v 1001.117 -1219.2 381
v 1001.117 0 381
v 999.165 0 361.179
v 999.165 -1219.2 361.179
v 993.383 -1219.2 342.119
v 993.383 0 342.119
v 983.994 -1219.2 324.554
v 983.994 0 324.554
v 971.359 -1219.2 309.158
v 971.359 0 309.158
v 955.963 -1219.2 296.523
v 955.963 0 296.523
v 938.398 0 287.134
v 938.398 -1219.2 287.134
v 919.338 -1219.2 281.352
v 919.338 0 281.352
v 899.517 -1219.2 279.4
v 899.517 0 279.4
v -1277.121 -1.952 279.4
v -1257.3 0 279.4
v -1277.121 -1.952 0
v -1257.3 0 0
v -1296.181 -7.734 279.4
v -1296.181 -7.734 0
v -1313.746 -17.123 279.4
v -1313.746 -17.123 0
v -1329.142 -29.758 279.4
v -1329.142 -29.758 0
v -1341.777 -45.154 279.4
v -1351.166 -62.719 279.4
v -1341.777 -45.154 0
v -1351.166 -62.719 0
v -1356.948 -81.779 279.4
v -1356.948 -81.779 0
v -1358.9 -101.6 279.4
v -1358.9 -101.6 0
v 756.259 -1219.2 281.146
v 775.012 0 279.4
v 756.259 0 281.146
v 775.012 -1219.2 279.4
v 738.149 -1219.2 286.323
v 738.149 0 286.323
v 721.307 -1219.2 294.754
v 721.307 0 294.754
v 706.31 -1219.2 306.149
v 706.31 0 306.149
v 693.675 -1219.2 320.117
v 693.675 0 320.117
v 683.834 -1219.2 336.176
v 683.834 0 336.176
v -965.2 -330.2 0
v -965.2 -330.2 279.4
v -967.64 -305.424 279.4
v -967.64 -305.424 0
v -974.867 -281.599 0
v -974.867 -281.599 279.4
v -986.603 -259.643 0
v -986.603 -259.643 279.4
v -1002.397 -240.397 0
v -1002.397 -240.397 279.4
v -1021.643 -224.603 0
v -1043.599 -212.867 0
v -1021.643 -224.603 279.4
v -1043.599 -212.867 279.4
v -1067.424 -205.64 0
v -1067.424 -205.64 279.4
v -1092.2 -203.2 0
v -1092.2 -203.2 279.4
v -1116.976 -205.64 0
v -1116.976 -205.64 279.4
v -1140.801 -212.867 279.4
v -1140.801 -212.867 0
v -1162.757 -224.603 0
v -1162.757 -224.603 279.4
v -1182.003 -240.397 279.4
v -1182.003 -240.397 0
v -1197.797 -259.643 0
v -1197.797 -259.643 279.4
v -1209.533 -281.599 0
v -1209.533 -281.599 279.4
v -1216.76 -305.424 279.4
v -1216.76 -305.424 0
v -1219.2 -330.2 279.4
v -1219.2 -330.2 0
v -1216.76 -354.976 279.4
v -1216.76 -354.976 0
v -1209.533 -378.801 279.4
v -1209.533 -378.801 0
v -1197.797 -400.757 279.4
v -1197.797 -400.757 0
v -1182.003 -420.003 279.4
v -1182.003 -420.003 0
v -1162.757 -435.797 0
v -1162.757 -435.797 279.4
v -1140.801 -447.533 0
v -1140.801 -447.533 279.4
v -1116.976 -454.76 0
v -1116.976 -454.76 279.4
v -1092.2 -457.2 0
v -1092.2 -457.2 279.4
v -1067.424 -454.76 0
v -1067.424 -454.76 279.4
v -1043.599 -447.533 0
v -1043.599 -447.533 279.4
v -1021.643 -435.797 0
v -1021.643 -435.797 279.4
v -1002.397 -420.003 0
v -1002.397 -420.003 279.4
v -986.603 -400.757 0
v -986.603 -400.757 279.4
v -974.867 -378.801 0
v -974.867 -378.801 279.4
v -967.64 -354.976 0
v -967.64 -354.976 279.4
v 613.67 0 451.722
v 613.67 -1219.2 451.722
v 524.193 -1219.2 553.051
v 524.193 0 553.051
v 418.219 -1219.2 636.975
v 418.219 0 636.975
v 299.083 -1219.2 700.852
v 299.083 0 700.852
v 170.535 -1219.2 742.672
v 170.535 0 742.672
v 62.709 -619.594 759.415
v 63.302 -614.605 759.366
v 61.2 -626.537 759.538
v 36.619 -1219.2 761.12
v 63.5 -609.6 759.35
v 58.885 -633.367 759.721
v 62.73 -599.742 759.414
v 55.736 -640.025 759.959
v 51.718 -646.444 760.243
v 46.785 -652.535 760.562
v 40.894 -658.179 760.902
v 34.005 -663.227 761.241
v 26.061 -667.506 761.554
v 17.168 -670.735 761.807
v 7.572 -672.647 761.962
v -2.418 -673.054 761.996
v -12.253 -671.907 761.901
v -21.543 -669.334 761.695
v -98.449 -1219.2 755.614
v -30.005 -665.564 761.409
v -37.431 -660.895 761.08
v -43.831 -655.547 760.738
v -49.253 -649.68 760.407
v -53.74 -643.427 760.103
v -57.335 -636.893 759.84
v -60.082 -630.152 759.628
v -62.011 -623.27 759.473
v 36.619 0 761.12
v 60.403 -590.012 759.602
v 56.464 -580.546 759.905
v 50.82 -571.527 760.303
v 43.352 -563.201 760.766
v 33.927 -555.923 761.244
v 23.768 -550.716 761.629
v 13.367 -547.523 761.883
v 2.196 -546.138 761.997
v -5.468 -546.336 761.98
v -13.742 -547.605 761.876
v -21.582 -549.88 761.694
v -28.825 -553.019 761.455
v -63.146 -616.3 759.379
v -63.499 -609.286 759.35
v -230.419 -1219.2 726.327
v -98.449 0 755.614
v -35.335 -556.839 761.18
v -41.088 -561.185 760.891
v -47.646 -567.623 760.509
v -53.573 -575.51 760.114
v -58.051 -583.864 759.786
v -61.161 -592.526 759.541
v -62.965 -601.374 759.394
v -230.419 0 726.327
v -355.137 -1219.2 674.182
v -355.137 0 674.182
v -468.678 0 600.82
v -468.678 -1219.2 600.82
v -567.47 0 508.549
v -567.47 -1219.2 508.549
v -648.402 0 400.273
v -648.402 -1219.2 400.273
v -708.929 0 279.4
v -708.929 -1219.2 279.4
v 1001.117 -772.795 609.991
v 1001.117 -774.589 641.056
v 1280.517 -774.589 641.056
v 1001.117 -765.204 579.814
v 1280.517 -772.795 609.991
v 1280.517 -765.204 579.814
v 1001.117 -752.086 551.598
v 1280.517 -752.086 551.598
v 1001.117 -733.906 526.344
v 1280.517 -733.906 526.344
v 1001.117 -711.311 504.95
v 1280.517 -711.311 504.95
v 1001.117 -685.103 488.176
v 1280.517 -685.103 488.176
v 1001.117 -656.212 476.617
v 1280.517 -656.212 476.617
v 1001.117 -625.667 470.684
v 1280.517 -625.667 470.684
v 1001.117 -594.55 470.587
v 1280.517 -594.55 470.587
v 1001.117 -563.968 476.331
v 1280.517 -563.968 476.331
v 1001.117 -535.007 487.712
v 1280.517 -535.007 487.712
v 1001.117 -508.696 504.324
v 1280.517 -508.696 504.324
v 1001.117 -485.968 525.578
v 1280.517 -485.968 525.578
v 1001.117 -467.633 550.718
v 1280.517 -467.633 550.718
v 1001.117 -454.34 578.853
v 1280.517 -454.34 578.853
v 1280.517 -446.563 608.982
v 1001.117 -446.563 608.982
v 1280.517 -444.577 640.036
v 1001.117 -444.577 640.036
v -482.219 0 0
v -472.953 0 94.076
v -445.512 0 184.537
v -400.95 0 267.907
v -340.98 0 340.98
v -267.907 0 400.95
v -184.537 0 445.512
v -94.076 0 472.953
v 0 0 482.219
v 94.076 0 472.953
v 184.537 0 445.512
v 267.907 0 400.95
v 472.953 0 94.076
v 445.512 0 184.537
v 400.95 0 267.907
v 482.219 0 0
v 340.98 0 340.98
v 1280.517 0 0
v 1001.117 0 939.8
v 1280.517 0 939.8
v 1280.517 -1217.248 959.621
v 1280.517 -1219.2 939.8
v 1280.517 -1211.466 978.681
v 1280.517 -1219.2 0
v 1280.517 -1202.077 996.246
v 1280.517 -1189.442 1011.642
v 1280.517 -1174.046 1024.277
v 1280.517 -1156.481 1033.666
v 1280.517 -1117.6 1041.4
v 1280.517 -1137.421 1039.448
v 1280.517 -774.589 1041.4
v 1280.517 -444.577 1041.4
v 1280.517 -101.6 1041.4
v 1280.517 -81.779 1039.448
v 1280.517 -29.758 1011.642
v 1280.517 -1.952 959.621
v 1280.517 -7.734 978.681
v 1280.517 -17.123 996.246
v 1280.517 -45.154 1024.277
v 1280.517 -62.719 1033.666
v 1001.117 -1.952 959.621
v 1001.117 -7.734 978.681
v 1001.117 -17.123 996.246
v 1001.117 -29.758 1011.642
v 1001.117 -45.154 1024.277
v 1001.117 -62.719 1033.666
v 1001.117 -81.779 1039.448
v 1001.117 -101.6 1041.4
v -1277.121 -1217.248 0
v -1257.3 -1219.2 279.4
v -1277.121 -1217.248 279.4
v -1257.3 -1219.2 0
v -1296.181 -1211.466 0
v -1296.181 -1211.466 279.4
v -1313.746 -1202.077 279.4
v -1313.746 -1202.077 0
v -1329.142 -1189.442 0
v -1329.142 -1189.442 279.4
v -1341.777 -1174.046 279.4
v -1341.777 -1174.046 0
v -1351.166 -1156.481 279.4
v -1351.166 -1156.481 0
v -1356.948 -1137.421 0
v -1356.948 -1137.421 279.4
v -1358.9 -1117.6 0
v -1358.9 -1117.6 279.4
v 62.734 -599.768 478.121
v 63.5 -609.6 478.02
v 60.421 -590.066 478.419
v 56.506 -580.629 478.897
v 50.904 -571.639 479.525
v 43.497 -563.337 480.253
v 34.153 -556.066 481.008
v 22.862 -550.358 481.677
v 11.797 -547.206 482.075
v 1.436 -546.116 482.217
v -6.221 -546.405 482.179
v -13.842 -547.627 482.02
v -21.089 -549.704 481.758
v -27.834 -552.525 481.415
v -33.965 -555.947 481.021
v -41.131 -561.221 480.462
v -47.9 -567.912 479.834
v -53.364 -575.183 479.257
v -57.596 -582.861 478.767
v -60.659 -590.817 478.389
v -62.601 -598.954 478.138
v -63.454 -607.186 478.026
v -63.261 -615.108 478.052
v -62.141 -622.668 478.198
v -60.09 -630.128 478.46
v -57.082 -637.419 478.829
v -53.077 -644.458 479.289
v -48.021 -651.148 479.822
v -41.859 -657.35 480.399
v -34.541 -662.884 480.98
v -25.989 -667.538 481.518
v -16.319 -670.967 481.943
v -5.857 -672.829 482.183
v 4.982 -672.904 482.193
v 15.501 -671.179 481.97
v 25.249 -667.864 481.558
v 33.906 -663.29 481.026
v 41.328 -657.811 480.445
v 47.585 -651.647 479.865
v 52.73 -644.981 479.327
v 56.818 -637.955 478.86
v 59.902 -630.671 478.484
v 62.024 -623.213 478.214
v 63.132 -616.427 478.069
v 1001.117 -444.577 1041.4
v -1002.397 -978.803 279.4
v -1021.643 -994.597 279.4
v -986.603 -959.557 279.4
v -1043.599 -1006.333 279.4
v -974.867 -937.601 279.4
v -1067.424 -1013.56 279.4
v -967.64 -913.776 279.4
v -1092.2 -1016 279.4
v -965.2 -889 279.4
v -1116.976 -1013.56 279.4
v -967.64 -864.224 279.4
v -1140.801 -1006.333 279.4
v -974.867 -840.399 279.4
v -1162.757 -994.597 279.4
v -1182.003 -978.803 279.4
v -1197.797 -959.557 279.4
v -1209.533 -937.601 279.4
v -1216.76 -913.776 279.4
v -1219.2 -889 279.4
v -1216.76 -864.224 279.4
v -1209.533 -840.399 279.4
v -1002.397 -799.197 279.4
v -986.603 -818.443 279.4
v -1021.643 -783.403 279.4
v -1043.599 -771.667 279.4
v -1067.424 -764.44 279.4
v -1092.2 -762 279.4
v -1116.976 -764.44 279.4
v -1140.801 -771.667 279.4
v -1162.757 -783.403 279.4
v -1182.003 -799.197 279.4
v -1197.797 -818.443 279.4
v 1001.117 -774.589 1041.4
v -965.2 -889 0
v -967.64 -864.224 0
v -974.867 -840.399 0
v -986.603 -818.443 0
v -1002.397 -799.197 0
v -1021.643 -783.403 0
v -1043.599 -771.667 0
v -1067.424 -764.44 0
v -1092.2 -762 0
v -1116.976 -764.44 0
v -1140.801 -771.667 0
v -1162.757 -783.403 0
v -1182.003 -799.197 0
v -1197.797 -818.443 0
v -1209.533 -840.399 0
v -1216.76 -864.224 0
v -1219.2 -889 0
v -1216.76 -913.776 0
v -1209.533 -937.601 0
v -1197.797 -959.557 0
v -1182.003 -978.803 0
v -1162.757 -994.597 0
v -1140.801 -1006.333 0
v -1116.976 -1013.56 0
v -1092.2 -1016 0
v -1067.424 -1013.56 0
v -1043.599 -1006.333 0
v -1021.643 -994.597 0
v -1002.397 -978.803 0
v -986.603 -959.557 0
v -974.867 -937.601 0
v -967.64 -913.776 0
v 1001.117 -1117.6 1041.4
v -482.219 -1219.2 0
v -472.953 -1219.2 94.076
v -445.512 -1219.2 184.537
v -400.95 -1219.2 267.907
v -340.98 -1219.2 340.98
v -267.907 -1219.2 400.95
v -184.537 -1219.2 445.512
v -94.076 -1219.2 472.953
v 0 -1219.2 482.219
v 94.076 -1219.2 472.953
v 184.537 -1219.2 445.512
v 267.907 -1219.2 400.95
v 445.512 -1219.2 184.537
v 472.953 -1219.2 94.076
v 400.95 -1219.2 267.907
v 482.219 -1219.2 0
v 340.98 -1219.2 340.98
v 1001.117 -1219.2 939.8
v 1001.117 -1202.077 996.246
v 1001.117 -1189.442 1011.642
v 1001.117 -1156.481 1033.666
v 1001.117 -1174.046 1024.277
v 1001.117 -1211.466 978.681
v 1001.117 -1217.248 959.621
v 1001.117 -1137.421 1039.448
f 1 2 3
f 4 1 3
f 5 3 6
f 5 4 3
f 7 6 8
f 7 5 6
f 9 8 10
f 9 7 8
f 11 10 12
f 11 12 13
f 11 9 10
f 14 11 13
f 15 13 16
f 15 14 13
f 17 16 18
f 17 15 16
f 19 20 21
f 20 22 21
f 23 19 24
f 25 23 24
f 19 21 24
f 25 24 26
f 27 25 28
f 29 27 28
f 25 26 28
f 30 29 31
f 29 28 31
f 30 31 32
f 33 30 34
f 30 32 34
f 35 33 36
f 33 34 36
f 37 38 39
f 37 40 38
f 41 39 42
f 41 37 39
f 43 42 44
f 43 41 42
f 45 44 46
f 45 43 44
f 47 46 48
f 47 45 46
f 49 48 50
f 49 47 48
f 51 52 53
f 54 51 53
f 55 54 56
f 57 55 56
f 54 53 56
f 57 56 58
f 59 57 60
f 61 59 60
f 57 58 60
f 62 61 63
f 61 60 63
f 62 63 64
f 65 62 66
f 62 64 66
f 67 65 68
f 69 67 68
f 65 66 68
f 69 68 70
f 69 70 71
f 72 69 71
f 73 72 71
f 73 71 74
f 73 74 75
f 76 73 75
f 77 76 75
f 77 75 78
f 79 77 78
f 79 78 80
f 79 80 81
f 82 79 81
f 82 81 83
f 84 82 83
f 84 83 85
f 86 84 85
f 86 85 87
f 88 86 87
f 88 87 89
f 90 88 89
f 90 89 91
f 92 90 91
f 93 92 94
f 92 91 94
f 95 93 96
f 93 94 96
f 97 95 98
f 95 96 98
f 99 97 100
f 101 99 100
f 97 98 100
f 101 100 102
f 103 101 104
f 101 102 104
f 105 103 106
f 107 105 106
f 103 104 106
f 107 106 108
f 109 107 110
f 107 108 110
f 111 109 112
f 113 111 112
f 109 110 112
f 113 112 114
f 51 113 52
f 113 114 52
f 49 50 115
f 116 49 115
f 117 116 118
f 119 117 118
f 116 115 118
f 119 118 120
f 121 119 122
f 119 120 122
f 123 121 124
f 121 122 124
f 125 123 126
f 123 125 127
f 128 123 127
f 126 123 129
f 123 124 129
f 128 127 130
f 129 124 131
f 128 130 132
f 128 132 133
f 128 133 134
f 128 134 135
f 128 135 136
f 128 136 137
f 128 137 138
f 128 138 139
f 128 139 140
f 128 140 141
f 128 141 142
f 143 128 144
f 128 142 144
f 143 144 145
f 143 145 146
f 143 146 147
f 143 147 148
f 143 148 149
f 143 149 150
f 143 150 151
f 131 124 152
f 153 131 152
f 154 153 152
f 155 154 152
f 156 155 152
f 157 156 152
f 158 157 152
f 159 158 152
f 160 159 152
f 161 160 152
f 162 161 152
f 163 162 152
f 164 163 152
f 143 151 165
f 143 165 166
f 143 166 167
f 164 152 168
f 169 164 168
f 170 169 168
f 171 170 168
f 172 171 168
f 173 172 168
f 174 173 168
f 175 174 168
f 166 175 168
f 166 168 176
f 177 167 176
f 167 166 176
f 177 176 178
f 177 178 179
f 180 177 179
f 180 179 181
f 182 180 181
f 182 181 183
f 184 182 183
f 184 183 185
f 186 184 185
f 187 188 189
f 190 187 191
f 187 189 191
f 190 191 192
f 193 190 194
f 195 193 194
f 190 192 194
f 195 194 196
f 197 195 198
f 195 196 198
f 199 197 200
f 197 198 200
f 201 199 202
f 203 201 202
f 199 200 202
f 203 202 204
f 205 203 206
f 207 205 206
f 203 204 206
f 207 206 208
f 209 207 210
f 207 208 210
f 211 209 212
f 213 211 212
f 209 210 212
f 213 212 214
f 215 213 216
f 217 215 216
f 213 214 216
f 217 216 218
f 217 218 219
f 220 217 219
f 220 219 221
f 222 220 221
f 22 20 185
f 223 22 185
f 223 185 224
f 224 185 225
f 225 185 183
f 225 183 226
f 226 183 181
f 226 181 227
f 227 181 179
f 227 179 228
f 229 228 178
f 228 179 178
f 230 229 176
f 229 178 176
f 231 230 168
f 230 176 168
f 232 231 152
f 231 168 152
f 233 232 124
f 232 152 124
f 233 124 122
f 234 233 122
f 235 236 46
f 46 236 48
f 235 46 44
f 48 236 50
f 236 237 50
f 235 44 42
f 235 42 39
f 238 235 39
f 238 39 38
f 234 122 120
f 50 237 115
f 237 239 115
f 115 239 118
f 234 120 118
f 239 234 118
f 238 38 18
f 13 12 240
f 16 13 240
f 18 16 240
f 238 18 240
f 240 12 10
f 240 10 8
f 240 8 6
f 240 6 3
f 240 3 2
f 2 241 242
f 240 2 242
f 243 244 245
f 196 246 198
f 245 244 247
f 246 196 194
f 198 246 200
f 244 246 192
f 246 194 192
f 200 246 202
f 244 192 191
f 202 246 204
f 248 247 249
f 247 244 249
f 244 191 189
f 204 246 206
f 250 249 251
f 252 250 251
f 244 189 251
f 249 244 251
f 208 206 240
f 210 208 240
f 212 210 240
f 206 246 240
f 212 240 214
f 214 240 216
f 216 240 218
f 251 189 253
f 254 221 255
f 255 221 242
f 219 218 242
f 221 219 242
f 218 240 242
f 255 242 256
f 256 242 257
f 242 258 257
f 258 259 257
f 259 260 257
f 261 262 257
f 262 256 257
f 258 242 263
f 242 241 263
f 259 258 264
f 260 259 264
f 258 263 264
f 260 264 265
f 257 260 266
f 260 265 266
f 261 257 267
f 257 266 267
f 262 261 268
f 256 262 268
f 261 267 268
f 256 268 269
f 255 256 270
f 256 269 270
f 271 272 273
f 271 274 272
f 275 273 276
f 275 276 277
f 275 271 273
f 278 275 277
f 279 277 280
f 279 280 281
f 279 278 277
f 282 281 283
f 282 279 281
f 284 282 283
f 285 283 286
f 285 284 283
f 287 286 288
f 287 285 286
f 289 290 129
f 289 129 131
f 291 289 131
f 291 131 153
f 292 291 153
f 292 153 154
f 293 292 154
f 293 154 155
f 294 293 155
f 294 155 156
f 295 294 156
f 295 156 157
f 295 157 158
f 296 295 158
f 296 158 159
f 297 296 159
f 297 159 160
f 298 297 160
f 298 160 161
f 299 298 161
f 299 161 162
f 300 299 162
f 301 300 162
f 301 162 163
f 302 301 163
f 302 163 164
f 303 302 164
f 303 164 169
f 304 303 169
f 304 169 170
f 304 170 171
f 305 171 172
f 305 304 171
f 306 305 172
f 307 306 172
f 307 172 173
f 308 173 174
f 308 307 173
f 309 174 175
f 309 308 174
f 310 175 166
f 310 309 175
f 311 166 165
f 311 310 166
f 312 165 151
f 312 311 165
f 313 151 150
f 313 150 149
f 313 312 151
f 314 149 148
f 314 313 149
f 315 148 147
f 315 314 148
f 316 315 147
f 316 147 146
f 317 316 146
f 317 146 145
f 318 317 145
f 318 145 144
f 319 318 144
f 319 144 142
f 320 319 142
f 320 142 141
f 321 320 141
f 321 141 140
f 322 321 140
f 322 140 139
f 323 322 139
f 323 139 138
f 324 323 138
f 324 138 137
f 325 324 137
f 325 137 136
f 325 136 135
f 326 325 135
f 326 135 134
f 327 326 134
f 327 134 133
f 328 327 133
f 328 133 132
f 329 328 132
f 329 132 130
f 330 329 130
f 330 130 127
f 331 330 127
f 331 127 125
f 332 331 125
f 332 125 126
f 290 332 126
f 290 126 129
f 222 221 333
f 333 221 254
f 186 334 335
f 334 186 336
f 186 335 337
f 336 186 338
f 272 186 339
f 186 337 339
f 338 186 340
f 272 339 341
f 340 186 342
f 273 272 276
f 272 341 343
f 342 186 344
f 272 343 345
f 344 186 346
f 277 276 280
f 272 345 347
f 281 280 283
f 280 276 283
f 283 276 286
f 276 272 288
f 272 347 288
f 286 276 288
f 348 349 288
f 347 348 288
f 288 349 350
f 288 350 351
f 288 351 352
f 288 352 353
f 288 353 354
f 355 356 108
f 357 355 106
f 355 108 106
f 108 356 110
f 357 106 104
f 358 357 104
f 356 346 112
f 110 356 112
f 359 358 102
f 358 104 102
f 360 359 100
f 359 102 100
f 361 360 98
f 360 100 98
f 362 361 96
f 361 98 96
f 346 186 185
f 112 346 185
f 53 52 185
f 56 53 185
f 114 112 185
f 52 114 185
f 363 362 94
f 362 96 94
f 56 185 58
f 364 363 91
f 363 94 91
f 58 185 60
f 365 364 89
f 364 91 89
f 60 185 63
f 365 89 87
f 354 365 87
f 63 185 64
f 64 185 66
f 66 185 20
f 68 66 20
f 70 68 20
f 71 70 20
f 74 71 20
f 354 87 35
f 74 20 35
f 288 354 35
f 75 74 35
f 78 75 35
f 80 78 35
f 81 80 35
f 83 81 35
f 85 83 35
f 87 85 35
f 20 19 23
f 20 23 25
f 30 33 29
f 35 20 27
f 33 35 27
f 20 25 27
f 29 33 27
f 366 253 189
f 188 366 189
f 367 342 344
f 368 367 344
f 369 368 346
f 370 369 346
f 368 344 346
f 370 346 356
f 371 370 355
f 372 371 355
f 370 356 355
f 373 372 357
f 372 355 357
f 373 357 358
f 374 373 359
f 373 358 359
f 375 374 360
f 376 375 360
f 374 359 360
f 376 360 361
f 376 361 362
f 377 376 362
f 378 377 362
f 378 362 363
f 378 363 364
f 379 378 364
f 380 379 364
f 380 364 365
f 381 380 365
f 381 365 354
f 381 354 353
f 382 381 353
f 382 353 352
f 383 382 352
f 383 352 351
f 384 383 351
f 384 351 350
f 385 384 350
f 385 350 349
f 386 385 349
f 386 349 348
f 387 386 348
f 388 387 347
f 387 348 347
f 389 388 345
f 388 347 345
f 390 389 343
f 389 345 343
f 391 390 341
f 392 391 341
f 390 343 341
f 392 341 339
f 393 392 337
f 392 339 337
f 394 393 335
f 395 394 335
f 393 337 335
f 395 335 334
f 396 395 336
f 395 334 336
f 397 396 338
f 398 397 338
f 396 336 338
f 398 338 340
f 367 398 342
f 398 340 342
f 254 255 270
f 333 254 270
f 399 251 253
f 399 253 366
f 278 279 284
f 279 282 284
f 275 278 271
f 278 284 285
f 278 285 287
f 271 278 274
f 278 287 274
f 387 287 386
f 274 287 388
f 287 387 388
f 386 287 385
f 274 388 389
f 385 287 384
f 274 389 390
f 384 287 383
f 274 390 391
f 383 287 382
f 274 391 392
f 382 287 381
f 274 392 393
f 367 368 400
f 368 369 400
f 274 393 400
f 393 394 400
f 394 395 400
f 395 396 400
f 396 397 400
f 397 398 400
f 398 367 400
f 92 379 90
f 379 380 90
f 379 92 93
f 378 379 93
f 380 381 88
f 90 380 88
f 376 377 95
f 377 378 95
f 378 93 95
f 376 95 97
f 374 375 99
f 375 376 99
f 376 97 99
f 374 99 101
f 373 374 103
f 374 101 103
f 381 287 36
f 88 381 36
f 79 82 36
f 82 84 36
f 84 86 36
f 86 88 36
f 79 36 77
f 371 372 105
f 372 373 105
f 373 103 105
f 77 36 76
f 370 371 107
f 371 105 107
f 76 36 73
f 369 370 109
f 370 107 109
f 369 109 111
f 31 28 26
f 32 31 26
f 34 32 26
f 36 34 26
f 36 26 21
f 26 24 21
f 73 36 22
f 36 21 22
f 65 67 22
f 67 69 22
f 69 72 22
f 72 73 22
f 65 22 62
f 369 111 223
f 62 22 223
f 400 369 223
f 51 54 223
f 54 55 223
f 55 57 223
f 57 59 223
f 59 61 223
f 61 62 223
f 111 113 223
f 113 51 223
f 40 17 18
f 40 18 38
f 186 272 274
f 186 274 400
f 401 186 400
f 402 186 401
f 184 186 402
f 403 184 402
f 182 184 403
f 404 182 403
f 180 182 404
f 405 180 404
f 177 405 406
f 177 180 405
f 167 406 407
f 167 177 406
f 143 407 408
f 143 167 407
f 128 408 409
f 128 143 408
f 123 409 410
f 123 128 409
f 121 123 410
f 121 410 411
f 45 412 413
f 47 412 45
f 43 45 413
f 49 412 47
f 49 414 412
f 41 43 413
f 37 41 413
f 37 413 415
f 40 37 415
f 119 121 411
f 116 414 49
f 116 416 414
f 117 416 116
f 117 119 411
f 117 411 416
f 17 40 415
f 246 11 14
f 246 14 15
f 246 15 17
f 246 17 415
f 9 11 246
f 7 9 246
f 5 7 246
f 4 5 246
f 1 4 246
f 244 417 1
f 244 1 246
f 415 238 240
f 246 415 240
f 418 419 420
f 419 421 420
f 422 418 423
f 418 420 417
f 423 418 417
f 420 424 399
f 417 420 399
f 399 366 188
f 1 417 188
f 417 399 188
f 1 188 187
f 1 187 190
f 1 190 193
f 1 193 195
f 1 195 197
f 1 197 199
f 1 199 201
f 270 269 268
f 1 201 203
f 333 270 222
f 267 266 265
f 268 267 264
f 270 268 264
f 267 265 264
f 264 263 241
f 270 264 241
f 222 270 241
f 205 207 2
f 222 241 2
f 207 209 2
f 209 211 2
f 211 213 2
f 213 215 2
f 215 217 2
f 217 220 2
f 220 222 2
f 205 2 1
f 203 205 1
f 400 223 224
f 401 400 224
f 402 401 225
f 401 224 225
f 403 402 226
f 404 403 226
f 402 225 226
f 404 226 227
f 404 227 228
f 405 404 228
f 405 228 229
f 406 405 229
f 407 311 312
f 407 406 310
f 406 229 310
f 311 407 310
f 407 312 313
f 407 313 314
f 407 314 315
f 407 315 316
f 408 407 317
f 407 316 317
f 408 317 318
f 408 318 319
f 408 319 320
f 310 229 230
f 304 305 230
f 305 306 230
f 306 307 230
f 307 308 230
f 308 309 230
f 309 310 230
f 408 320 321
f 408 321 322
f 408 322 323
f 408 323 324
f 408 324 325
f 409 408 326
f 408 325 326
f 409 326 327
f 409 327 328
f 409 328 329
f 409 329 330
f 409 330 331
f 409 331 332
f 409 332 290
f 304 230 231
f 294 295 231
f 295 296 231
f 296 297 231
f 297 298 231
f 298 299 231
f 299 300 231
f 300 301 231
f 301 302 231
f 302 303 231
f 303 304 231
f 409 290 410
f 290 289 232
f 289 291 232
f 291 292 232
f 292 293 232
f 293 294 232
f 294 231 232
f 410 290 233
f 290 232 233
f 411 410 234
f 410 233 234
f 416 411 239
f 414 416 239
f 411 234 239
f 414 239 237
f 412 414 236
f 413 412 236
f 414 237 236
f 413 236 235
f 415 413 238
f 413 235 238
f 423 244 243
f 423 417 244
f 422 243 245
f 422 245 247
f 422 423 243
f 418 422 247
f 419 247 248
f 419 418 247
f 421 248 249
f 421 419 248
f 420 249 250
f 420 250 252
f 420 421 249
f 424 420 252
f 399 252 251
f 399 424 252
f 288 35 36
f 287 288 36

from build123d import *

# Parameters (mm, degrees)
F1_DEPTH      = 1219.2
F3_DEPTH      = 526.82718
F4_R          = 127
F4_R_2        = 63.5
F5_DEPTH      = 279.401
F5_DEPTH_BACK = 762.001
F6_R          = 101.6


with BuildPart() as f1:
    # F0 (on Front) → F1 (new body)
    with BuildSketch(Plane.XZ):
        with BuildLine():
            ThreePointArc((-482.219, 0), (0, 482.219), (482.219, 0))
            Line((482.219, 0), (1280.5168718338, 0))
            Line((1280.5168718338, 0), (1280.5168718338, 279.4))
            Line((1280.5168718338, 279.4), (1280.5168718338, 1041.4))
            Line((1280.5168718338, 1041.4), (1001.1168718338, 1041.4))
            Line((1001.1168718338, 1041.4), (1001.1168718338, 279.4))
            Line((1001.1168718338, 279.4), (708.9285154372, 279.4))
            ThreePointArc((708.9285154372, 279.4), (0, 762), (-708.9285154372, 279.4))
            Line((-708.9285154372, 279.4), (-1358.9, 279.4))
            Line((-1358.9, 279.4), (-1358.9, 0))
            Line((-1358.9, 0), (-482.219, 0))
        make_face()
    extrude(amount=F1_DEPTH)

    # F2 (on face) → F3 (cut)
    with BuildSketch(Plane.YZ.offset(1280.5168718338)):
        with BuildLine():
            Line((-774.5888896633, 1041.4), (-774.5888896633, 641.0560950858))
            ThreePointArc((-774.5888896633, 641.0560950858), (-610.110559149, 469.9007894345), (-444.5768100975, 640.0355530376))
            Line((-444.5768100975, 640.0355530376), (-444.5768100975, 1041.4))
            Line((-444.5768100975, 1041.4), (-774.5888896633, 1041.4))
        make_face()
    extrude(amount=-F3_DEPTH, mode=Mode.SUBTRACT)

    # F4 (on face) → F5 (cut, two sides)
    with BuildSketch(Plane.XY.offset(279.4)) as f5_sk:
        with Locations((-1092.2, -889)):
            Circle(F4_R)
        with Locations((-1092.2, -330.2)):
            Circle(F4_R)
        with Locations((0, -609.6)):
            Circle(F4_R_2)
    extrude(amount=-F5_DEPTH, mode=Mode.SUBTRACT)
    extrude(f5_sk.sketch, amount=F5_DEPTH_BACK, mode=Mode.SUBTRACT)

    # F6
    f6_edges = [f1.edges().sort_by_distance(p)[0] for p in [
        (1140.816872, -1219.2, 1041.4),
        (1001.116872, -609.6, 279.4),
        (-1358.9, -1219.2, 139.7),
        (1140.816872, 0, 1041.4),
        (-1358.9, 0, 139.7),
        (708.928515, -609.6, 279.4),
    ]]
    fillet(f6_edges, radius=F6_R)


solid = f1.part
